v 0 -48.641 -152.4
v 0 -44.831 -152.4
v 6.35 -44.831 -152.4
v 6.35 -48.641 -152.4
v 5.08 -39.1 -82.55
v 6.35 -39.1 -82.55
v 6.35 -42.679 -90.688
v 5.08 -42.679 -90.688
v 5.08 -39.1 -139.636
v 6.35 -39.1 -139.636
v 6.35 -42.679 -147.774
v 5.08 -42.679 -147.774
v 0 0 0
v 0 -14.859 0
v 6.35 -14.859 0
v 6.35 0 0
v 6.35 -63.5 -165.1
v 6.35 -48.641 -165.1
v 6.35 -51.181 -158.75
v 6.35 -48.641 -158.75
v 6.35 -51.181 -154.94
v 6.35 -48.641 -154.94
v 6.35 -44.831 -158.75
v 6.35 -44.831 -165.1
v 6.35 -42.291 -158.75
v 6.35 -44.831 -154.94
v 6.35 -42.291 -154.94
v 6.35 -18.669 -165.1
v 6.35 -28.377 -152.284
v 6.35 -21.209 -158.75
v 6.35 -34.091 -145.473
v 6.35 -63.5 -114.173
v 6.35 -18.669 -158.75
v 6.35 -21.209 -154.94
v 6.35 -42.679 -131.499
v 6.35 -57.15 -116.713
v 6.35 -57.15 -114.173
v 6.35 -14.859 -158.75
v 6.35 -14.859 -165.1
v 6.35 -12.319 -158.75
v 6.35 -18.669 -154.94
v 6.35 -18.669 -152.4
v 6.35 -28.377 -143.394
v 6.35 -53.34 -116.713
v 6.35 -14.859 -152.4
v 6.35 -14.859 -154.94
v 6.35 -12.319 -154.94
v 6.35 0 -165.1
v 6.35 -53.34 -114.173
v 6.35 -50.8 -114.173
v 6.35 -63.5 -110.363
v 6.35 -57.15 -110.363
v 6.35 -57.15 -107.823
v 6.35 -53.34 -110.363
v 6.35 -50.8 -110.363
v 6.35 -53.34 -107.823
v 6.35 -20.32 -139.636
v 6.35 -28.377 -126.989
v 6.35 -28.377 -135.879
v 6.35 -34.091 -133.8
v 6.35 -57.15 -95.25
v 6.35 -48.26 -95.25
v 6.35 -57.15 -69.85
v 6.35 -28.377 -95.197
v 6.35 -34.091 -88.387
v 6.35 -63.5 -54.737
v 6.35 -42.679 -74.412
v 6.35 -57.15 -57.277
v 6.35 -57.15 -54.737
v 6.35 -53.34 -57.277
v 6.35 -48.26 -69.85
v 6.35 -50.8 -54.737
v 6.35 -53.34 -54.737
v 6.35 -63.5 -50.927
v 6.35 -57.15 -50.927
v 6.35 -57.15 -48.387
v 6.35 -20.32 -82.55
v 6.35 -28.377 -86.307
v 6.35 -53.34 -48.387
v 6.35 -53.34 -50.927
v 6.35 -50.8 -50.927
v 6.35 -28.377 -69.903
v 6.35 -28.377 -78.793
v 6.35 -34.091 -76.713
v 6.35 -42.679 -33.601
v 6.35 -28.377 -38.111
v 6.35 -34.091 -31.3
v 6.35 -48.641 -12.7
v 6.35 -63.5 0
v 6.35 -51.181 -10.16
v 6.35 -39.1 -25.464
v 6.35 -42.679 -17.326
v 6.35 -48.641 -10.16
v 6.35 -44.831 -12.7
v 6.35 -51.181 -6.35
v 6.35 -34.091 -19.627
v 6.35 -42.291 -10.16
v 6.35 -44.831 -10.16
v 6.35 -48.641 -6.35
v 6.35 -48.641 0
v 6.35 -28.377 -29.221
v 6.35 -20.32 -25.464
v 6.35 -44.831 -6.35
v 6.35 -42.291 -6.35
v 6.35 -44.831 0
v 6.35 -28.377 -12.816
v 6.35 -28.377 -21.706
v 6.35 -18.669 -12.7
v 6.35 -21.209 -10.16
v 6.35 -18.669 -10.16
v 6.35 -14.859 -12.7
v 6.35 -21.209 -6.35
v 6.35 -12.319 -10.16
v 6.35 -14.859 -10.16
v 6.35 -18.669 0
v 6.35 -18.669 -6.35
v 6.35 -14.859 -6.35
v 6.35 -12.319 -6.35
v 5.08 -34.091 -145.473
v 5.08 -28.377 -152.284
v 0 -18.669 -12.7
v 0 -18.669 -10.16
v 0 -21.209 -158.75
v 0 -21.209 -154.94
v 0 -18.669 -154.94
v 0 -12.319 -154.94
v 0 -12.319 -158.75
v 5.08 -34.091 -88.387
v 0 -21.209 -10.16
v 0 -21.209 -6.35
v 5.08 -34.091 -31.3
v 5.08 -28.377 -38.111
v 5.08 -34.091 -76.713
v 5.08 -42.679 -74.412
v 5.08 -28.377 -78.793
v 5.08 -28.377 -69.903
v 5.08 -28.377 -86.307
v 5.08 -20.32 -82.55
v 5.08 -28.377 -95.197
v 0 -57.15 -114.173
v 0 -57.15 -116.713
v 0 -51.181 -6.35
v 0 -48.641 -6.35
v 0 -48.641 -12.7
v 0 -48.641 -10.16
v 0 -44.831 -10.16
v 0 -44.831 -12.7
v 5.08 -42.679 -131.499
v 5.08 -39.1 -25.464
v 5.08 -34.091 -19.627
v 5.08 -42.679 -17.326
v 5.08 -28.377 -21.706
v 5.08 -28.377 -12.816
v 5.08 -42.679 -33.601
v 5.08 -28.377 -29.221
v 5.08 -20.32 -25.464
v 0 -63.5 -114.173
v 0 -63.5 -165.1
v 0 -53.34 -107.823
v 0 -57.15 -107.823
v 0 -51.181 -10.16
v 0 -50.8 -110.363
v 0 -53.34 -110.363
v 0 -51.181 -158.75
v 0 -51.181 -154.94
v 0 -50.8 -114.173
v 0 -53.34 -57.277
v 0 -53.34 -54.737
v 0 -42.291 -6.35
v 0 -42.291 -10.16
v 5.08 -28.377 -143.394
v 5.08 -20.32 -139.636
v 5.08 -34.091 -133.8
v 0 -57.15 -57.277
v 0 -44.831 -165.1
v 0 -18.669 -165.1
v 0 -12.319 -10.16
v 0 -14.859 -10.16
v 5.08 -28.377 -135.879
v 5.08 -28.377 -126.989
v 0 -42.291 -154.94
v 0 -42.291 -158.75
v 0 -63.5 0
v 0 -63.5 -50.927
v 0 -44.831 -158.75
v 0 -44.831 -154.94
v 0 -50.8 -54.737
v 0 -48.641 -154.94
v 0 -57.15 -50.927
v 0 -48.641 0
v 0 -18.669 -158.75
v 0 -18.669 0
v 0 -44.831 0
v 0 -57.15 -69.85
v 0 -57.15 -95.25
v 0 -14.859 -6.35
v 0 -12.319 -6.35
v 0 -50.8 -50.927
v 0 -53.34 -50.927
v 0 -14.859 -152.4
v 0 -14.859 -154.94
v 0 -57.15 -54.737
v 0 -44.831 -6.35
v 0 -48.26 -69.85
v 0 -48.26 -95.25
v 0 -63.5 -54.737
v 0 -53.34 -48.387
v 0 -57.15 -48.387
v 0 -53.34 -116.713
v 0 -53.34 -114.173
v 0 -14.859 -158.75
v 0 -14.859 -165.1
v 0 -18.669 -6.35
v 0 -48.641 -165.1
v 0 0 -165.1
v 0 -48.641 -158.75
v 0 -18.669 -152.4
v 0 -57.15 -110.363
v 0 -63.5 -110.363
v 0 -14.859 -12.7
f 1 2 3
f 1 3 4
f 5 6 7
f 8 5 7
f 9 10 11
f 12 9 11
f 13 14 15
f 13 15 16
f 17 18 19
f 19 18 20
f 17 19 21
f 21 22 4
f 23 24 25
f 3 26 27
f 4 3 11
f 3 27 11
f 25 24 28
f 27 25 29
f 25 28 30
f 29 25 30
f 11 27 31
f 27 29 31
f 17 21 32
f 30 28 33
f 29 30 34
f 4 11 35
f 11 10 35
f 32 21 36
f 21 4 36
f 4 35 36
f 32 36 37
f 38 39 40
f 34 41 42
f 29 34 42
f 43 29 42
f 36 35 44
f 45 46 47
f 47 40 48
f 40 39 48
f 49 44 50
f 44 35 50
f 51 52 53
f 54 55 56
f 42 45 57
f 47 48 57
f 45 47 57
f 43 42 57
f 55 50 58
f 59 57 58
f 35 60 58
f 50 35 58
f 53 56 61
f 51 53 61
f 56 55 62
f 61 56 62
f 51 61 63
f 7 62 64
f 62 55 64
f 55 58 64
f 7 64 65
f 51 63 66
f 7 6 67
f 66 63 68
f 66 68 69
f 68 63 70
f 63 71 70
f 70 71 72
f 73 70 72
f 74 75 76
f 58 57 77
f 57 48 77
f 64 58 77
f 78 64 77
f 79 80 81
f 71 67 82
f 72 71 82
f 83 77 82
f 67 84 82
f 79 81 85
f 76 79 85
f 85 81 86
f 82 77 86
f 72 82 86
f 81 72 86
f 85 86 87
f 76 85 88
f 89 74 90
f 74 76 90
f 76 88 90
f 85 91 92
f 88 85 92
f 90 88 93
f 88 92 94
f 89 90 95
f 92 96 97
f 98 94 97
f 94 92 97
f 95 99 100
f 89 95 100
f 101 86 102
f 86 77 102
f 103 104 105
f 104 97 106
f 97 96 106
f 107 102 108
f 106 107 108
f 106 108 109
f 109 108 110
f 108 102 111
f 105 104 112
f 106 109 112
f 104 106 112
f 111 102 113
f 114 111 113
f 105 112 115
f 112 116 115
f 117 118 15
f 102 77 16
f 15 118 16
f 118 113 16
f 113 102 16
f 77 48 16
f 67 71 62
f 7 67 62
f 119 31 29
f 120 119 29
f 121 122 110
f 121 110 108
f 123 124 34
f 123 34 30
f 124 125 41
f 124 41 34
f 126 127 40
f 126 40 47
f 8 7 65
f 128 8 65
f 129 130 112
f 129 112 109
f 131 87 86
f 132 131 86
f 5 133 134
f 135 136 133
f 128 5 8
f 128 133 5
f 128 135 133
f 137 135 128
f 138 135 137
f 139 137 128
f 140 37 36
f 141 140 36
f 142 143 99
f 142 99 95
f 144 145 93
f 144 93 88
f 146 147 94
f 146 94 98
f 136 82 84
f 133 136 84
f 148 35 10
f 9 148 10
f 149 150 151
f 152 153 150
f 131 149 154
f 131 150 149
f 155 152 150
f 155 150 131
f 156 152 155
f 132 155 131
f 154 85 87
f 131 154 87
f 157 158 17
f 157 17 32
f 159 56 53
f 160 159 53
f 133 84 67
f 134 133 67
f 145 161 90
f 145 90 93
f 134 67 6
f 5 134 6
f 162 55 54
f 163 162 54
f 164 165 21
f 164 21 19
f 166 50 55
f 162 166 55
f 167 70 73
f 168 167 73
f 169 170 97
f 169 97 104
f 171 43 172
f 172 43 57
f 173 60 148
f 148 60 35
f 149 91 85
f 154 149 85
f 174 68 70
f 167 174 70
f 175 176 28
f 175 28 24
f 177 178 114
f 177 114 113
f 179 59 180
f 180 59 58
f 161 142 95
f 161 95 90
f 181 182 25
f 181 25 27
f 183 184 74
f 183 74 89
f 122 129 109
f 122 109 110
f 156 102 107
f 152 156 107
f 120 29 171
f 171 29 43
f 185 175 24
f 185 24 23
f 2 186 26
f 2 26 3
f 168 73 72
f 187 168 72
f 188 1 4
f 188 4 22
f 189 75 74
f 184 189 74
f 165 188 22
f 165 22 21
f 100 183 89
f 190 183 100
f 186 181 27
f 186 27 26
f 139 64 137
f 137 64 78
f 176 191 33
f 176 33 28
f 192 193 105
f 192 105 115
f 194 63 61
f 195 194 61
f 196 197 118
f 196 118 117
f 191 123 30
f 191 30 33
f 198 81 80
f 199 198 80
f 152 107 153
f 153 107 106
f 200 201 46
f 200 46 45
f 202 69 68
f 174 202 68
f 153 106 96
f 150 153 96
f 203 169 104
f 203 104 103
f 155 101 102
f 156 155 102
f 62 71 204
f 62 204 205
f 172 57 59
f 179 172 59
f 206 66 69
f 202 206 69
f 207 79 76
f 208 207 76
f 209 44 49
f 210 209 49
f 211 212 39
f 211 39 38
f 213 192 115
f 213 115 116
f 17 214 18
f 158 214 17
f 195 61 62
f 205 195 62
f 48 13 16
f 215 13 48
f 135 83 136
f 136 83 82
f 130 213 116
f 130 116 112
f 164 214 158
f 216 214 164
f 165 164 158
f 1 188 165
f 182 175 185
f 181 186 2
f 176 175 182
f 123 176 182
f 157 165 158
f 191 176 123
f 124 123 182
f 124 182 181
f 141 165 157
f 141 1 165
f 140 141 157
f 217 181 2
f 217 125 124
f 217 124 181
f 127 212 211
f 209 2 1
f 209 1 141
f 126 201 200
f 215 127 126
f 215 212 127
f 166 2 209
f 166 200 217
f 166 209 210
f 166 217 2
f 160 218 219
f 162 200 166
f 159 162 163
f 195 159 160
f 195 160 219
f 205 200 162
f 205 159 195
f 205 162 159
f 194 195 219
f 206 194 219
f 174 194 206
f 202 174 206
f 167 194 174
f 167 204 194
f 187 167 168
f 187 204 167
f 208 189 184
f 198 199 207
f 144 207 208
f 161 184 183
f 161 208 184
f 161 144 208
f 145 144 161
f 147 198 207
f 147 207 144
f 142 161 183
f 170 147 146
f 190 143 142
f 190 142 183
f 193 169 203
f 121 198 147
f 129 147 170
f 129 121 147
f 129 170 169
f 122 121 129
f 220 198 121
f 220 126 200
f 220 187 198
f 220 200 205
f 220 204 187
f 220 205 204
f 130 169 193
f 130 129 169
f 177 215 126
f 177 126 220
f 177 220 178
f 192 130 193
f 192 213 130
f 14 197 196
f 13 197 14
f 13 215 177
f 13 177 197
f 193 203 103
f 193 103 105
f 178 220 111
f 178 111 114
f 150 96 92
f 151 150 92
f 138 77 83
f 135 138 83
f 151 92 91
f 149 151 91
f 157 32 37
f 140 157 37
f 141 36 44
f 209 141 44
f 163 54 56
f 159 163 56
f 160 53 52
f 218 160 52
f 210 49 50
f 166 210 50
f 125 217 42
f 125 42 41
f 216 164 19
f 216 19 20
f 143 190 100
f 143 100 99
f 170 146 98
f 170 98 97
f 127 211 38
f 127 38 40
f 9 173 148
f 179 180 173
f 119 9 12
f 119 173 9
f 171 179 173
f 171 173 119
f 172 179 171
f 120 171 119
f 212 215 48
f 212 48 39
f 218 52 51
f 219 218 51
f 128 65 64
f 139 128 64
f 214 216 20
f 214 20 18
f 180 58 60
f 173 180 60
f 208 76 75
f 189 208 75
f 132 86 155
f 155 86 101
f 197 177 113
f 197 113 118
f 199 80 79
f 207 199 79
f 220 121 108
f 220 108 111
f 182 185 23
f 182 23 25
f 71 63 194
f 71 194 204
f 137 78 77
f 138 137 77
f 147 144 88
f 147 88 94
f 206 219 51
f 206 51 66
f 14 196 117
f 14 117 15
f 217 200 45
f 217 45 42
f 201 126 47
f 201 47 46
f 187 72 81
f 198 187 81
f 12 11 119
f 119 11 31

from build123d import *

# Parameters (mm, degrees)
BOSS_EXTRUDE1_DEPTH = 6.35
CUT_EXTRUDE1_DEPTH  = 178.004470283
CUT_EXTRUDE2_DEPTH  = 1.27
SKETCH4_W           = 25.4
SKETCH4_H           = 8.89
CUT_EXTRUDE3_DEPTH  = 178.004470283


with BuildPart() as part:
    # Sketch1 → Boss-Extrude1 (new body)
    with BuildSketch(Plane(origin=(0, 0, 0), x_dir=(0, 0, -1), z_dir=(1, 0, 0))):
        Polygon((0, 0), (165.1, 0), (165.1, -14.859), (158.75, -14.859), (158.75, -12.319), (154.94, -12.319), (154.94, -14.859), (152.4, -14.859), (152.4, -18.669), (154.94, -18.669), (154.94, -21.209), (158.75, -21.209), (158.75, -18.669), (165.1, -18.669), (165.1, -44.831), (158.75, -44.831), (158.75, -42.291), (154.94, -42.291), (154.94, -44.831), (152.4, -44.831), (152.4, -48.641), (154.94, -48.641), (154.94, -51.181), (158.75, -51.181), (158.75, -48.641), (165.1, -48.641), (165.1, -63.5), (0, -63.5), (0, -48.641), (6.35, -48.641), (6.35, -51.181), (10.16, -51.181), (10.16, -48.641), (12.7, -48.641), (12.7, -44.831), (10.16, -44.831), (10.16, -42.291), (6.35, -42.291), (6.35, -44.831), (0, -44.831), (0, -18.669), (6.35, -18.669), (6.35, -21.209), (10.16, -21.209), (10.16, -18.669), (12.7, -18.669), (12.7, -14.859), (10.16, -14.859), (10.16, -12.319), (6.35, -12.319), (6.35, -14.859), (0, -14.859), align=None)
    extrude(amount=BOSS_EXTRUDE1_DEPTH)

    # Sketch2 → Cut-Extrude1 (cut, through all)
    with BuildSketch(Plane(origin=(6.35, 0, 0), x_dir=(0, 0, -1), z_dir=(1, 0, 0))):
        Polygon((50.927, -63.5), (54.737, -63.5), (54.737, -57.15), (57.277, -57.15), (57.277, -53.34), (54.737, -53.34), (54.737, -50.8), (50.927, -50.8), (50.927, -53.34), (48.387, -53.34), (48.387, -57.15), (50.927, -57.15), align=None)
        Polygon((110.363, -63.5), (114.173, -63.5), (114.173, -57.15), (116.713, -57.15), (116.713, -53.34), (114.173, -53.34), (114.173, -50.8), (110.363, -50.8), (110.363, -53.34), (107.823, -53.34), (107.823, -57.15), (110.363, -57.15), align=None)
    extrude(amount=-CUT_EXTRUDE1_DEPTH, mode=Mode.SUBTRACT)

    # Sketch3 → Cut-Extrude2 (cut)
    with BuildSketch(Plane(origin=(6.35, 0, 0), x_dir=(0, 0, -1), z_dir=(1, 0, 0))):
        Polygon((82.55, -20.32), (78.792923653, -28.377076227), (69.902923653, -28.377076227), (76.713058752, -34.091458077), (74.412157441, -42.678538673), (82.55, -39.09976535), (90.687842559, -42.678538673), (88.386941248, -34.091458077), (95.197076347, -28.377076227), (86.307076347, -28.377076227), align=None)
        Polygon((25.4635, -20.32), (21.706423653, -28.377076227), (12.816423653, -28.377076227), (19.626558752, -34.091458077), (17.325657441, -42.678538673), (25.4635, -39.09976535), (33.601342559, -42.678538673), (31.300441248, -34.091458077), (38.110576347, -28.377076227), (29.220576347, -28.377076227), align=None)
        Polygon((139.6365, -20.32), (135.879423653, -28.377076227), (126.989423653, -28.377076227), (133.799558752, -34.091458077), (131.498657441, -42.678538673), (139.6365, -39.09976535), (147.774342559, -42.678538673), (145.473441248, -34.091458077), (152.283576347, -28.377076227), (143.393576347, -28.377076227), align=None)
    extrude(amount=-CUT_EXTRUDE2_DEPTH, mode=Mode.SUBTRACT)

    # Sketch4 → Cut-Extrude3 (cut, through all)
    with BuildSketch(Plane(origin=(6.35, 0, 0), x_dir=(0, 0, -1), z_dir=(1, 0, 0))):
        with Locations((82.55, -52.705)):
            Rectangle(SKETCH4_W, SKETCH4_H)
    extrude(amount=-CUT_EXTRUDE3_DEPTH, mode=Mode.SUBTRACT)


solid = part.part
